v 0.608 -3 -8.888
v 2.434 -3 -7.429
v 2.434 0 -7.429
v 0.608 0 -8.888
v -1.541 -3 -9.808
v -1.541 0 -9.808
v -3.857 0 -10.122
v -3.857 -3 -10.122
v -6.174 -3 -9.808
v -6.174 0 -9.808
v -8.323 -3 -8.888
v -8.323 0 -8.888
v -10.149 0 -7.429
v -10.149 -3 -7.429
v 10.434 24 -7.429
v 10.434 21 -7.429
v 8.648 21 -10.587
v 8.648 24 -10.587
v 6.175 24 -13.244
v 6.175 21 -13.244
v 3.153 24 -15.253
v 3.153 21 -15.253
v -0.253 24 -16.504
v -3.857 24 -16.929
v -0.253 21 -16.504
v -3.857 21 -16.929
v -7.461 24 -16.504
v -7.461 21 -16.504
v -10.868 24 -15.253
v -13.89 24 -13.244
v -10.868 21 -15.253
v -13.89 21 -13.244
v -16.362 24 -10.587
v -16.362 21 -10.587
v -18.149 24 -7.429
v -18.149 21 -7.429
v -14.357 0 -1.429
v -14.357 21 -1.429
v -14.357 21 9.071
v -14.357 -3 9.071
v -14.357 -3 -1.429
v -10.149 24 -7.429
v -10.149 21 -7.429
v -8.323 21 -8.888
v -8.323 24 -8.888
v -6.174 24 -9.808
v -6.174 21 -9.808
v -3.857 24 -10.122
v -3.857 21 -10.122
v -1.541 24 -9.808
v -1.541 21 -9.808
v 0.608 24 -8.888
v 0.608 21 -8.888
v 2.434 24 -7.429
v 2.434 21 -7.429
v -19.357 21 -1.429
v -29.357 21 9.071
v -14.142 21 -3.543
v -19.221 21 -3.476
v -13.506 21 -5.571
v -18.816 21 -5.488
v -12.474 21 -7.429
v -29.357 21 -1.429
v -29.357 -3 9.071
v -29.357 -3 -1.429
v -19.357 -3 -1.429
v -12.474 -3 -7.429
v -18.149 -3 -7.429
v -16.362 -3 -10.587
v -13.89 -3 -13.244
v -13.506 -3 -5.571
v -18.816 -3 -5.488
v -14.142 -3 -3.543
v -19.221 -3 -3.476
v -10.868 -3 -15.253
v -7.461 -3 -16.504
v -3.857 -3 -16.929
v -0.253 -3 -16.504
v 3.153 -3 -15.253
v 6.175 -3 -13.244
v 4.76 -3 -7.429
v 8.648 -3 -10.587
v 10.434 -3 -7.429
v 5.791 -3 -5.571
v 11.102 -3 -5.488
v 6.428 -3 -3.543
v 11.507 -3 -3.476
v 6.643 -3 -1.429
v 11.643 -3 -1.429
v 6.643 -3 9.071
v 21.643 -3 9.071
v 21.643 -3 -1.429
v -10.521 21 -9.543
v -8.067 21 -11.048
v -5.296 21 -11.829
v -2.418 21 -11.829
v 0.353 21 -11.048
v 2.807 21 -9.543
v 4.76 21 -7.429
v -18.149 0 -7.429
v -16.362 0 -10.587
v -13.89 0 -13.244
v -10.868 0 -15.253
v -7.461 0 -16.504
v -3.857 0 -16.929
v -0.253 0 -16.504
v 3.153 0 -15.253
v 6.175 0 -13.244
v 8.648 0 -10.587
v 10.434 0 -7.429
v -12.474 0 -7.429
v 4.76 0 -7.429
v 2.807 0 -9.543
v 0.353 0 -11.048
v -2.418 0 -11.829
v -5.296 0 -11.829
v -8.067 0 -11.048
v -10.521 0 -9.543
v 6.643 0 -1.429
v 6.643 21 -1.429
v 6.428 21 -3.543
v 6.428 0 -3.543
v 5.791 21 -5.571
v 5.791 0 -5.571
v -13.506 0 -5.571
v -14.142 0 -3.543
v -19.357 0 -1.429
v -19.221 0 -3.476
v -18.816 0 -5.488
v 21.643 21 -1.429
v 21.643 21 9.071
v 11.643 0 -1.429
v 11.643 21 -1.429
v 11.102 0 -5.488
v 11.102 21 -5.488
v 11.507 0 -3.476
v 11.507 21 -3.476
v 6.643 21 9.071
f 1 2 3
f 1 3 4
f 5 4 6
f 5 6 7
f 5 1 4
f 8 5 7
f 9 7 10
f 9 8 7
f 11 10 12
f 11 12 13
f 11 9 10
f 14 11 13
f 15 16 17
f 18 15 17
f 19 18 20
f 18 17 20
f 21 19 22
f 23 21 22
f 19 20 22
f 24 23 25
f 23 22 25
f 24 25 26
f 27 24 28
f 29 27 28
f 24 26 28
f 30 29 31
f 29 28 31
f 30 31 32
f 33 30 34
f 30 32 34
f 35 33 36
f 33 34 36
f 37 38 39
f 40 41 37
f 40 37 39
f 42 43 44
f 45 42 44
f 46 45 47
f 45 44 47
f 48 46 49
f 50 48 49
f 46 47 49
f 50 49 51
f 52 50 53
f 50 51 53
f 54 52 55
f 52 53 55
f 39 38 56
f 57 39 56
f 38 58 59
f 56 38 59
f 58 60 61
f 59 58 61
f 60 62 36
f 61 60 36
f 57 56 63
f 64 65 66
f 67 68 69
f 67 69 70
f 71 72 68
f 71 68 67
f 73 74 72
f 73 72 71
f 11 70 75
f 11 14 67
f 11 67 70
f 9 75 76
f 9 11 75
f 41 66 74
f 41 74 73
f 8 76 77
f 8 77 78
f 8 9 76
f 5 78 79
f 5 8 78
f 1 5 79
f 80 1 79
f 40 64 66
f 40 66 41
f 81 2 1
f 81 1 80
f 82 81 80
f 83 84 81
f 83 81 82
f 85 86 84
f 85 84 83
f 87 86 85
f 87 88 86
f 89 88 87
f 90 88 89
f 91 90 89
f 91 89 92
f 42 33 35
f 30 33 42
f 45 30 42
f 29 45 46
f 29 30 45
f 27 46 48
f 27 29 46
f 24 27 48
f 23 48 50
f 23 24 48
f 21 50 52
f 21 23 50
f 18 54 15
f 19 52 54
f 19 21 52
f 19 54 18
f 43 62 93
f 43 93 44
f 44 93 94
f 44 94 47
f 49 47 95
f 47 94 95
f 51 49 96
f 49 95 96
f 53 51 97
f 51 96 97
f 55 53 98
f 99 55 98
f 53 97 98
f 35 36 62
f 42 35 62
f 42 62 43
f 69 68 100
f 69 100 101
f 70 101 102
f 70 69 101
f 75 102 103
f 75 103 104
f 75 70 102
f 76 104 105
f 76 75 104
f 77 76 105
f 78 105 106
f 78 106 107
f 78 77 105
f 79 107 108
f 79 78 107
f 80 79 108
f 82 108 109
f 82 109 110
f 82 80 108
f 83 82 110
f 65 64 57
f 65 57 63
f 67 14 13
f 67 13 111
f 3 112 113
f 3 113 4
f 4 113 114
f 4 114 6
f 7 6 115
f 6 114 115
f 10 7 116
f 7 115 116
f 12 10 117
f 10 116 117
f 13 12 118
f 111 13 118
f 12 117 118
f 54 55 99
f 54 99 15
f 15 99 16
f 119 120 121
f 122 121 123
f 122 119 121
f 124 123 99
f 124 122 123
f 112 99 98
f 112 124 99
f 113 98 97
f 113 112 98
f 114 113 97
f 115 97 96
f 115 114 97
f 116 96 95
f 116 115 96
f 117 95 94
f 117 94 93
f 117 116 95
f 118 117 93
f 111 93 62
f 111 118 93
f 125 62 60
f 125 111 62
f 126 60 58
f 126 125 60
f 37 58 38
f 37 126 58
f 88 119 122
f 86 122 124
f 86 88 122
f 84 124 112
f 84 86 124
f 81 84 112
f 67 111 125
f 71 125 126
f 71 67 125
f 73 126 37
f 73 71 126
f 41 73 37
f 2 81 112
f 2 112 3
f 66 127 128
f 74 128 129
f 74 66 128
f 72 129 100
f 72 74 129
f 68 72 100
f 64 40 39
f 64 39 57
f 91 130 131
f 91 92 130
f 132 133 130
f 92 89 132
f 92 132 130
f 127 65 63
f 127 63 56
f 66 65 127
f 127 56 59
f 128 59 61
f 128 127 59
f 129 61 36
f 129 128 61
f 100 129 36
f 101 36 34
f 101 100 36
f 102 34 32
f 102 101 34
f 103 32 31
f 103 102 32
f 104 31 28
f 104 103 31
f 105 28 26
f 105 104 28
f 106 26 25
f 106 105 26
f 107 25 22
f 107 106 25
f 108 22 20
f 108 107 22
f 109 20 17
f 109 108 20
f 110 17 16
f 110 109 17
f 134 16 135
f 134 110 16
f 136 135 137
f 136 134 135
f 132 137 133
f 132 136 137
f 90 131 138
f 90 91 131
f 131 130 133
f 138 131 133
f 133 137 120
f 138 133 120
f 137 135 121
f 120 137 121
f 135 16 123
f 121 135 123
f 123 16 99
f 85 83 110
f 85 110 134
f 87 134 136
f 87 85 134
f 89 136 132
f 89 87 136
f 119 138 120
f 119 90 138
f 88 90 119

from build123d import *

# Parameters (mm, degrees)
BOSS_EXTRU_1_DEPTH = 21
BOSS_EXTRU_2_DEPTH = 3
BOSS_EXTRU_3_START = 3
BOSS_EXTRU_3_DEPTH = 3
BOSS_EXTRU_5_START = 3
BOSS_EXTRU_5_DEPTH = 3


with BuildPart() as part:
    # Esquisse1 → Boss.-Extru.1 (new body)
    with BuildSketch(Plane(origin=(0, 0, 0), x_dir=(1, 0, 0), z_dir=(0, 1, 0))):
        with BuildLine():
            ThreePointArc((-19.357142857, 1.428571429), (-3.857142857, 16.928571429), (11.642857143, 1.428571429))
            Line((11.642857143, 1.428571429), (21.642857143, 1.428571429))
            Line((21.642857143, 1.428571429), (21.642857143, -9.071428571))
            Line((21.642857143, -9.071428571), (11.642857143, -9.071428571))
            Line((11.642857143, -9.071428571), (6.642857143, -9.071428571))
            Line((6.642857143, -9.071428571), (6.642857143, 1.428571429))
            ThreePointArc((6.642857143, 1.428571429), (-3.857142857, 11.928571429), (-14.357142857, 1.428571429))
            Line((-14.357142857, 1.428571429), (-14.357142857, -9.071428571))
            Line((-14.357142857, -9.071428571), (-19.357142857, -9.071428571))
            Line((-19.357142857, -9.071428571), (-29.357142857, -9.071428571))
            Line((-29.357142857, -9.071428571), (-29.357142857, 1.428571429))
            Line((-29.357142857, 1.428571429), (-19.357142857, 1.428571429))
        make_face()
    extrude(amount=BOSS_EXTRU_1_DEPTH)

    # Esquisse2 → Boss.-Extru.2 (add)
    with BuildSketch(Plane(origin=(0, 21, 0), x_dir=(1, 0, 0), z_dir=(0, 1, 0))):
        with BuildLine():
            Line((-18.148749115, 7.428571429), (-10.148749115, 7.428571429))
            ThreePointArc((-10.148749115, 7.428571429), (-3.857142857, 10.122495129), (2.4344634, 7.428571429))
            Line((2.4344634, 7.428571429), (10.4344634, 7.428571429))
            ThreePointArc((10.4344634, 7.428571429), (-3.857142857, 16.928571733), (-18.148749115, 7.428571429))
        make_face()
    extrude(amount=BOSS_EXTRU_2_DEPTH)

    # Esquisse3 → Boss.-Extru.3 (add)
    with BuildSketch(Plane(origin=(0, 0, 0), x_dir=(-1, 0, 0), z_dir=(0, -1, 0)).offset(BOSS_EXTRU_3_START)):
        with BuildLine():
            Line((-10.434463071, 7.428571429), (-2.434463071, 7.428571429))
            ThreePointArc((-2.434463071, 7.428571429), (3.857142857, 10.12249489), (10.148748785, 7.428571429))
            Line((10.148748785, 7.428571429), (18.148748785, 7.428571429))
            ThreePointArc((18.148748785, 7.428571429), (3.857142857, 16.928571429), (-10.434463071, 7.428571429))
        make_face()
    extrude(amount=-BOSS_EXTRU_3_DEPTH)

    # Esquisse5 → Boss.-Extru.5 (add)
    with BuildSketch(Plane.XZ.offset(BOSS_EXTRU_5_START)):
        with BuildLine():
            Line((-18.148748785, -7.428571429), (-12.473986827, -7.428571429))
            ThreePointArc((-12.473986827, -7.428571429), (-13.875297919, -4.572862948), (-14.357142857, -1.428571429))
            Line((-14.357142857, -1.428571429), (-14.357142857, 9.071428571))
            Line((-14.357142857, 9.071428571), (-29.357142857, 9.071428571))
            Line((-29.357142857, 9.071428571), (-29.357142857, -1.428571429))
            Line((-29.357142857, -1.428571429), (-19.357142857, -1.428571429))
            ThreePointArc((-19.357142857, -1.428571429), (-19.052041539, -4.488809011), (-18.148748785, -7.428571429))
        make_face()
        with BuildLine():
            Line((4.759701113, -7.428571429), (10.434463071, -7.428571429))
            ThreePointArc((10.434463071, -7.428571429), (11.337755824, -4.488809011), (11.642857143, -1.428571429))
            Line((11.642857143, -1.428571429), (21.642857143, -1.428571429))
            Line((21.642857143, -1.428571429), (21.642857143, 9.071428571))
            Line((21.642857143, 9.071428571), (6.642857143, 9.071428571))
            Line((6.642857143, 9.071428571), (6.642857143, -1.428571429))
            ThreePointArc((6.642857143, -1.428571429), (6.161012205, -4.572862948), (4.759701113, -7.428571429))
        make_face()
    extrude(amount=-BOSS_EXTRU_5_DEPTH)


solid = part.part
